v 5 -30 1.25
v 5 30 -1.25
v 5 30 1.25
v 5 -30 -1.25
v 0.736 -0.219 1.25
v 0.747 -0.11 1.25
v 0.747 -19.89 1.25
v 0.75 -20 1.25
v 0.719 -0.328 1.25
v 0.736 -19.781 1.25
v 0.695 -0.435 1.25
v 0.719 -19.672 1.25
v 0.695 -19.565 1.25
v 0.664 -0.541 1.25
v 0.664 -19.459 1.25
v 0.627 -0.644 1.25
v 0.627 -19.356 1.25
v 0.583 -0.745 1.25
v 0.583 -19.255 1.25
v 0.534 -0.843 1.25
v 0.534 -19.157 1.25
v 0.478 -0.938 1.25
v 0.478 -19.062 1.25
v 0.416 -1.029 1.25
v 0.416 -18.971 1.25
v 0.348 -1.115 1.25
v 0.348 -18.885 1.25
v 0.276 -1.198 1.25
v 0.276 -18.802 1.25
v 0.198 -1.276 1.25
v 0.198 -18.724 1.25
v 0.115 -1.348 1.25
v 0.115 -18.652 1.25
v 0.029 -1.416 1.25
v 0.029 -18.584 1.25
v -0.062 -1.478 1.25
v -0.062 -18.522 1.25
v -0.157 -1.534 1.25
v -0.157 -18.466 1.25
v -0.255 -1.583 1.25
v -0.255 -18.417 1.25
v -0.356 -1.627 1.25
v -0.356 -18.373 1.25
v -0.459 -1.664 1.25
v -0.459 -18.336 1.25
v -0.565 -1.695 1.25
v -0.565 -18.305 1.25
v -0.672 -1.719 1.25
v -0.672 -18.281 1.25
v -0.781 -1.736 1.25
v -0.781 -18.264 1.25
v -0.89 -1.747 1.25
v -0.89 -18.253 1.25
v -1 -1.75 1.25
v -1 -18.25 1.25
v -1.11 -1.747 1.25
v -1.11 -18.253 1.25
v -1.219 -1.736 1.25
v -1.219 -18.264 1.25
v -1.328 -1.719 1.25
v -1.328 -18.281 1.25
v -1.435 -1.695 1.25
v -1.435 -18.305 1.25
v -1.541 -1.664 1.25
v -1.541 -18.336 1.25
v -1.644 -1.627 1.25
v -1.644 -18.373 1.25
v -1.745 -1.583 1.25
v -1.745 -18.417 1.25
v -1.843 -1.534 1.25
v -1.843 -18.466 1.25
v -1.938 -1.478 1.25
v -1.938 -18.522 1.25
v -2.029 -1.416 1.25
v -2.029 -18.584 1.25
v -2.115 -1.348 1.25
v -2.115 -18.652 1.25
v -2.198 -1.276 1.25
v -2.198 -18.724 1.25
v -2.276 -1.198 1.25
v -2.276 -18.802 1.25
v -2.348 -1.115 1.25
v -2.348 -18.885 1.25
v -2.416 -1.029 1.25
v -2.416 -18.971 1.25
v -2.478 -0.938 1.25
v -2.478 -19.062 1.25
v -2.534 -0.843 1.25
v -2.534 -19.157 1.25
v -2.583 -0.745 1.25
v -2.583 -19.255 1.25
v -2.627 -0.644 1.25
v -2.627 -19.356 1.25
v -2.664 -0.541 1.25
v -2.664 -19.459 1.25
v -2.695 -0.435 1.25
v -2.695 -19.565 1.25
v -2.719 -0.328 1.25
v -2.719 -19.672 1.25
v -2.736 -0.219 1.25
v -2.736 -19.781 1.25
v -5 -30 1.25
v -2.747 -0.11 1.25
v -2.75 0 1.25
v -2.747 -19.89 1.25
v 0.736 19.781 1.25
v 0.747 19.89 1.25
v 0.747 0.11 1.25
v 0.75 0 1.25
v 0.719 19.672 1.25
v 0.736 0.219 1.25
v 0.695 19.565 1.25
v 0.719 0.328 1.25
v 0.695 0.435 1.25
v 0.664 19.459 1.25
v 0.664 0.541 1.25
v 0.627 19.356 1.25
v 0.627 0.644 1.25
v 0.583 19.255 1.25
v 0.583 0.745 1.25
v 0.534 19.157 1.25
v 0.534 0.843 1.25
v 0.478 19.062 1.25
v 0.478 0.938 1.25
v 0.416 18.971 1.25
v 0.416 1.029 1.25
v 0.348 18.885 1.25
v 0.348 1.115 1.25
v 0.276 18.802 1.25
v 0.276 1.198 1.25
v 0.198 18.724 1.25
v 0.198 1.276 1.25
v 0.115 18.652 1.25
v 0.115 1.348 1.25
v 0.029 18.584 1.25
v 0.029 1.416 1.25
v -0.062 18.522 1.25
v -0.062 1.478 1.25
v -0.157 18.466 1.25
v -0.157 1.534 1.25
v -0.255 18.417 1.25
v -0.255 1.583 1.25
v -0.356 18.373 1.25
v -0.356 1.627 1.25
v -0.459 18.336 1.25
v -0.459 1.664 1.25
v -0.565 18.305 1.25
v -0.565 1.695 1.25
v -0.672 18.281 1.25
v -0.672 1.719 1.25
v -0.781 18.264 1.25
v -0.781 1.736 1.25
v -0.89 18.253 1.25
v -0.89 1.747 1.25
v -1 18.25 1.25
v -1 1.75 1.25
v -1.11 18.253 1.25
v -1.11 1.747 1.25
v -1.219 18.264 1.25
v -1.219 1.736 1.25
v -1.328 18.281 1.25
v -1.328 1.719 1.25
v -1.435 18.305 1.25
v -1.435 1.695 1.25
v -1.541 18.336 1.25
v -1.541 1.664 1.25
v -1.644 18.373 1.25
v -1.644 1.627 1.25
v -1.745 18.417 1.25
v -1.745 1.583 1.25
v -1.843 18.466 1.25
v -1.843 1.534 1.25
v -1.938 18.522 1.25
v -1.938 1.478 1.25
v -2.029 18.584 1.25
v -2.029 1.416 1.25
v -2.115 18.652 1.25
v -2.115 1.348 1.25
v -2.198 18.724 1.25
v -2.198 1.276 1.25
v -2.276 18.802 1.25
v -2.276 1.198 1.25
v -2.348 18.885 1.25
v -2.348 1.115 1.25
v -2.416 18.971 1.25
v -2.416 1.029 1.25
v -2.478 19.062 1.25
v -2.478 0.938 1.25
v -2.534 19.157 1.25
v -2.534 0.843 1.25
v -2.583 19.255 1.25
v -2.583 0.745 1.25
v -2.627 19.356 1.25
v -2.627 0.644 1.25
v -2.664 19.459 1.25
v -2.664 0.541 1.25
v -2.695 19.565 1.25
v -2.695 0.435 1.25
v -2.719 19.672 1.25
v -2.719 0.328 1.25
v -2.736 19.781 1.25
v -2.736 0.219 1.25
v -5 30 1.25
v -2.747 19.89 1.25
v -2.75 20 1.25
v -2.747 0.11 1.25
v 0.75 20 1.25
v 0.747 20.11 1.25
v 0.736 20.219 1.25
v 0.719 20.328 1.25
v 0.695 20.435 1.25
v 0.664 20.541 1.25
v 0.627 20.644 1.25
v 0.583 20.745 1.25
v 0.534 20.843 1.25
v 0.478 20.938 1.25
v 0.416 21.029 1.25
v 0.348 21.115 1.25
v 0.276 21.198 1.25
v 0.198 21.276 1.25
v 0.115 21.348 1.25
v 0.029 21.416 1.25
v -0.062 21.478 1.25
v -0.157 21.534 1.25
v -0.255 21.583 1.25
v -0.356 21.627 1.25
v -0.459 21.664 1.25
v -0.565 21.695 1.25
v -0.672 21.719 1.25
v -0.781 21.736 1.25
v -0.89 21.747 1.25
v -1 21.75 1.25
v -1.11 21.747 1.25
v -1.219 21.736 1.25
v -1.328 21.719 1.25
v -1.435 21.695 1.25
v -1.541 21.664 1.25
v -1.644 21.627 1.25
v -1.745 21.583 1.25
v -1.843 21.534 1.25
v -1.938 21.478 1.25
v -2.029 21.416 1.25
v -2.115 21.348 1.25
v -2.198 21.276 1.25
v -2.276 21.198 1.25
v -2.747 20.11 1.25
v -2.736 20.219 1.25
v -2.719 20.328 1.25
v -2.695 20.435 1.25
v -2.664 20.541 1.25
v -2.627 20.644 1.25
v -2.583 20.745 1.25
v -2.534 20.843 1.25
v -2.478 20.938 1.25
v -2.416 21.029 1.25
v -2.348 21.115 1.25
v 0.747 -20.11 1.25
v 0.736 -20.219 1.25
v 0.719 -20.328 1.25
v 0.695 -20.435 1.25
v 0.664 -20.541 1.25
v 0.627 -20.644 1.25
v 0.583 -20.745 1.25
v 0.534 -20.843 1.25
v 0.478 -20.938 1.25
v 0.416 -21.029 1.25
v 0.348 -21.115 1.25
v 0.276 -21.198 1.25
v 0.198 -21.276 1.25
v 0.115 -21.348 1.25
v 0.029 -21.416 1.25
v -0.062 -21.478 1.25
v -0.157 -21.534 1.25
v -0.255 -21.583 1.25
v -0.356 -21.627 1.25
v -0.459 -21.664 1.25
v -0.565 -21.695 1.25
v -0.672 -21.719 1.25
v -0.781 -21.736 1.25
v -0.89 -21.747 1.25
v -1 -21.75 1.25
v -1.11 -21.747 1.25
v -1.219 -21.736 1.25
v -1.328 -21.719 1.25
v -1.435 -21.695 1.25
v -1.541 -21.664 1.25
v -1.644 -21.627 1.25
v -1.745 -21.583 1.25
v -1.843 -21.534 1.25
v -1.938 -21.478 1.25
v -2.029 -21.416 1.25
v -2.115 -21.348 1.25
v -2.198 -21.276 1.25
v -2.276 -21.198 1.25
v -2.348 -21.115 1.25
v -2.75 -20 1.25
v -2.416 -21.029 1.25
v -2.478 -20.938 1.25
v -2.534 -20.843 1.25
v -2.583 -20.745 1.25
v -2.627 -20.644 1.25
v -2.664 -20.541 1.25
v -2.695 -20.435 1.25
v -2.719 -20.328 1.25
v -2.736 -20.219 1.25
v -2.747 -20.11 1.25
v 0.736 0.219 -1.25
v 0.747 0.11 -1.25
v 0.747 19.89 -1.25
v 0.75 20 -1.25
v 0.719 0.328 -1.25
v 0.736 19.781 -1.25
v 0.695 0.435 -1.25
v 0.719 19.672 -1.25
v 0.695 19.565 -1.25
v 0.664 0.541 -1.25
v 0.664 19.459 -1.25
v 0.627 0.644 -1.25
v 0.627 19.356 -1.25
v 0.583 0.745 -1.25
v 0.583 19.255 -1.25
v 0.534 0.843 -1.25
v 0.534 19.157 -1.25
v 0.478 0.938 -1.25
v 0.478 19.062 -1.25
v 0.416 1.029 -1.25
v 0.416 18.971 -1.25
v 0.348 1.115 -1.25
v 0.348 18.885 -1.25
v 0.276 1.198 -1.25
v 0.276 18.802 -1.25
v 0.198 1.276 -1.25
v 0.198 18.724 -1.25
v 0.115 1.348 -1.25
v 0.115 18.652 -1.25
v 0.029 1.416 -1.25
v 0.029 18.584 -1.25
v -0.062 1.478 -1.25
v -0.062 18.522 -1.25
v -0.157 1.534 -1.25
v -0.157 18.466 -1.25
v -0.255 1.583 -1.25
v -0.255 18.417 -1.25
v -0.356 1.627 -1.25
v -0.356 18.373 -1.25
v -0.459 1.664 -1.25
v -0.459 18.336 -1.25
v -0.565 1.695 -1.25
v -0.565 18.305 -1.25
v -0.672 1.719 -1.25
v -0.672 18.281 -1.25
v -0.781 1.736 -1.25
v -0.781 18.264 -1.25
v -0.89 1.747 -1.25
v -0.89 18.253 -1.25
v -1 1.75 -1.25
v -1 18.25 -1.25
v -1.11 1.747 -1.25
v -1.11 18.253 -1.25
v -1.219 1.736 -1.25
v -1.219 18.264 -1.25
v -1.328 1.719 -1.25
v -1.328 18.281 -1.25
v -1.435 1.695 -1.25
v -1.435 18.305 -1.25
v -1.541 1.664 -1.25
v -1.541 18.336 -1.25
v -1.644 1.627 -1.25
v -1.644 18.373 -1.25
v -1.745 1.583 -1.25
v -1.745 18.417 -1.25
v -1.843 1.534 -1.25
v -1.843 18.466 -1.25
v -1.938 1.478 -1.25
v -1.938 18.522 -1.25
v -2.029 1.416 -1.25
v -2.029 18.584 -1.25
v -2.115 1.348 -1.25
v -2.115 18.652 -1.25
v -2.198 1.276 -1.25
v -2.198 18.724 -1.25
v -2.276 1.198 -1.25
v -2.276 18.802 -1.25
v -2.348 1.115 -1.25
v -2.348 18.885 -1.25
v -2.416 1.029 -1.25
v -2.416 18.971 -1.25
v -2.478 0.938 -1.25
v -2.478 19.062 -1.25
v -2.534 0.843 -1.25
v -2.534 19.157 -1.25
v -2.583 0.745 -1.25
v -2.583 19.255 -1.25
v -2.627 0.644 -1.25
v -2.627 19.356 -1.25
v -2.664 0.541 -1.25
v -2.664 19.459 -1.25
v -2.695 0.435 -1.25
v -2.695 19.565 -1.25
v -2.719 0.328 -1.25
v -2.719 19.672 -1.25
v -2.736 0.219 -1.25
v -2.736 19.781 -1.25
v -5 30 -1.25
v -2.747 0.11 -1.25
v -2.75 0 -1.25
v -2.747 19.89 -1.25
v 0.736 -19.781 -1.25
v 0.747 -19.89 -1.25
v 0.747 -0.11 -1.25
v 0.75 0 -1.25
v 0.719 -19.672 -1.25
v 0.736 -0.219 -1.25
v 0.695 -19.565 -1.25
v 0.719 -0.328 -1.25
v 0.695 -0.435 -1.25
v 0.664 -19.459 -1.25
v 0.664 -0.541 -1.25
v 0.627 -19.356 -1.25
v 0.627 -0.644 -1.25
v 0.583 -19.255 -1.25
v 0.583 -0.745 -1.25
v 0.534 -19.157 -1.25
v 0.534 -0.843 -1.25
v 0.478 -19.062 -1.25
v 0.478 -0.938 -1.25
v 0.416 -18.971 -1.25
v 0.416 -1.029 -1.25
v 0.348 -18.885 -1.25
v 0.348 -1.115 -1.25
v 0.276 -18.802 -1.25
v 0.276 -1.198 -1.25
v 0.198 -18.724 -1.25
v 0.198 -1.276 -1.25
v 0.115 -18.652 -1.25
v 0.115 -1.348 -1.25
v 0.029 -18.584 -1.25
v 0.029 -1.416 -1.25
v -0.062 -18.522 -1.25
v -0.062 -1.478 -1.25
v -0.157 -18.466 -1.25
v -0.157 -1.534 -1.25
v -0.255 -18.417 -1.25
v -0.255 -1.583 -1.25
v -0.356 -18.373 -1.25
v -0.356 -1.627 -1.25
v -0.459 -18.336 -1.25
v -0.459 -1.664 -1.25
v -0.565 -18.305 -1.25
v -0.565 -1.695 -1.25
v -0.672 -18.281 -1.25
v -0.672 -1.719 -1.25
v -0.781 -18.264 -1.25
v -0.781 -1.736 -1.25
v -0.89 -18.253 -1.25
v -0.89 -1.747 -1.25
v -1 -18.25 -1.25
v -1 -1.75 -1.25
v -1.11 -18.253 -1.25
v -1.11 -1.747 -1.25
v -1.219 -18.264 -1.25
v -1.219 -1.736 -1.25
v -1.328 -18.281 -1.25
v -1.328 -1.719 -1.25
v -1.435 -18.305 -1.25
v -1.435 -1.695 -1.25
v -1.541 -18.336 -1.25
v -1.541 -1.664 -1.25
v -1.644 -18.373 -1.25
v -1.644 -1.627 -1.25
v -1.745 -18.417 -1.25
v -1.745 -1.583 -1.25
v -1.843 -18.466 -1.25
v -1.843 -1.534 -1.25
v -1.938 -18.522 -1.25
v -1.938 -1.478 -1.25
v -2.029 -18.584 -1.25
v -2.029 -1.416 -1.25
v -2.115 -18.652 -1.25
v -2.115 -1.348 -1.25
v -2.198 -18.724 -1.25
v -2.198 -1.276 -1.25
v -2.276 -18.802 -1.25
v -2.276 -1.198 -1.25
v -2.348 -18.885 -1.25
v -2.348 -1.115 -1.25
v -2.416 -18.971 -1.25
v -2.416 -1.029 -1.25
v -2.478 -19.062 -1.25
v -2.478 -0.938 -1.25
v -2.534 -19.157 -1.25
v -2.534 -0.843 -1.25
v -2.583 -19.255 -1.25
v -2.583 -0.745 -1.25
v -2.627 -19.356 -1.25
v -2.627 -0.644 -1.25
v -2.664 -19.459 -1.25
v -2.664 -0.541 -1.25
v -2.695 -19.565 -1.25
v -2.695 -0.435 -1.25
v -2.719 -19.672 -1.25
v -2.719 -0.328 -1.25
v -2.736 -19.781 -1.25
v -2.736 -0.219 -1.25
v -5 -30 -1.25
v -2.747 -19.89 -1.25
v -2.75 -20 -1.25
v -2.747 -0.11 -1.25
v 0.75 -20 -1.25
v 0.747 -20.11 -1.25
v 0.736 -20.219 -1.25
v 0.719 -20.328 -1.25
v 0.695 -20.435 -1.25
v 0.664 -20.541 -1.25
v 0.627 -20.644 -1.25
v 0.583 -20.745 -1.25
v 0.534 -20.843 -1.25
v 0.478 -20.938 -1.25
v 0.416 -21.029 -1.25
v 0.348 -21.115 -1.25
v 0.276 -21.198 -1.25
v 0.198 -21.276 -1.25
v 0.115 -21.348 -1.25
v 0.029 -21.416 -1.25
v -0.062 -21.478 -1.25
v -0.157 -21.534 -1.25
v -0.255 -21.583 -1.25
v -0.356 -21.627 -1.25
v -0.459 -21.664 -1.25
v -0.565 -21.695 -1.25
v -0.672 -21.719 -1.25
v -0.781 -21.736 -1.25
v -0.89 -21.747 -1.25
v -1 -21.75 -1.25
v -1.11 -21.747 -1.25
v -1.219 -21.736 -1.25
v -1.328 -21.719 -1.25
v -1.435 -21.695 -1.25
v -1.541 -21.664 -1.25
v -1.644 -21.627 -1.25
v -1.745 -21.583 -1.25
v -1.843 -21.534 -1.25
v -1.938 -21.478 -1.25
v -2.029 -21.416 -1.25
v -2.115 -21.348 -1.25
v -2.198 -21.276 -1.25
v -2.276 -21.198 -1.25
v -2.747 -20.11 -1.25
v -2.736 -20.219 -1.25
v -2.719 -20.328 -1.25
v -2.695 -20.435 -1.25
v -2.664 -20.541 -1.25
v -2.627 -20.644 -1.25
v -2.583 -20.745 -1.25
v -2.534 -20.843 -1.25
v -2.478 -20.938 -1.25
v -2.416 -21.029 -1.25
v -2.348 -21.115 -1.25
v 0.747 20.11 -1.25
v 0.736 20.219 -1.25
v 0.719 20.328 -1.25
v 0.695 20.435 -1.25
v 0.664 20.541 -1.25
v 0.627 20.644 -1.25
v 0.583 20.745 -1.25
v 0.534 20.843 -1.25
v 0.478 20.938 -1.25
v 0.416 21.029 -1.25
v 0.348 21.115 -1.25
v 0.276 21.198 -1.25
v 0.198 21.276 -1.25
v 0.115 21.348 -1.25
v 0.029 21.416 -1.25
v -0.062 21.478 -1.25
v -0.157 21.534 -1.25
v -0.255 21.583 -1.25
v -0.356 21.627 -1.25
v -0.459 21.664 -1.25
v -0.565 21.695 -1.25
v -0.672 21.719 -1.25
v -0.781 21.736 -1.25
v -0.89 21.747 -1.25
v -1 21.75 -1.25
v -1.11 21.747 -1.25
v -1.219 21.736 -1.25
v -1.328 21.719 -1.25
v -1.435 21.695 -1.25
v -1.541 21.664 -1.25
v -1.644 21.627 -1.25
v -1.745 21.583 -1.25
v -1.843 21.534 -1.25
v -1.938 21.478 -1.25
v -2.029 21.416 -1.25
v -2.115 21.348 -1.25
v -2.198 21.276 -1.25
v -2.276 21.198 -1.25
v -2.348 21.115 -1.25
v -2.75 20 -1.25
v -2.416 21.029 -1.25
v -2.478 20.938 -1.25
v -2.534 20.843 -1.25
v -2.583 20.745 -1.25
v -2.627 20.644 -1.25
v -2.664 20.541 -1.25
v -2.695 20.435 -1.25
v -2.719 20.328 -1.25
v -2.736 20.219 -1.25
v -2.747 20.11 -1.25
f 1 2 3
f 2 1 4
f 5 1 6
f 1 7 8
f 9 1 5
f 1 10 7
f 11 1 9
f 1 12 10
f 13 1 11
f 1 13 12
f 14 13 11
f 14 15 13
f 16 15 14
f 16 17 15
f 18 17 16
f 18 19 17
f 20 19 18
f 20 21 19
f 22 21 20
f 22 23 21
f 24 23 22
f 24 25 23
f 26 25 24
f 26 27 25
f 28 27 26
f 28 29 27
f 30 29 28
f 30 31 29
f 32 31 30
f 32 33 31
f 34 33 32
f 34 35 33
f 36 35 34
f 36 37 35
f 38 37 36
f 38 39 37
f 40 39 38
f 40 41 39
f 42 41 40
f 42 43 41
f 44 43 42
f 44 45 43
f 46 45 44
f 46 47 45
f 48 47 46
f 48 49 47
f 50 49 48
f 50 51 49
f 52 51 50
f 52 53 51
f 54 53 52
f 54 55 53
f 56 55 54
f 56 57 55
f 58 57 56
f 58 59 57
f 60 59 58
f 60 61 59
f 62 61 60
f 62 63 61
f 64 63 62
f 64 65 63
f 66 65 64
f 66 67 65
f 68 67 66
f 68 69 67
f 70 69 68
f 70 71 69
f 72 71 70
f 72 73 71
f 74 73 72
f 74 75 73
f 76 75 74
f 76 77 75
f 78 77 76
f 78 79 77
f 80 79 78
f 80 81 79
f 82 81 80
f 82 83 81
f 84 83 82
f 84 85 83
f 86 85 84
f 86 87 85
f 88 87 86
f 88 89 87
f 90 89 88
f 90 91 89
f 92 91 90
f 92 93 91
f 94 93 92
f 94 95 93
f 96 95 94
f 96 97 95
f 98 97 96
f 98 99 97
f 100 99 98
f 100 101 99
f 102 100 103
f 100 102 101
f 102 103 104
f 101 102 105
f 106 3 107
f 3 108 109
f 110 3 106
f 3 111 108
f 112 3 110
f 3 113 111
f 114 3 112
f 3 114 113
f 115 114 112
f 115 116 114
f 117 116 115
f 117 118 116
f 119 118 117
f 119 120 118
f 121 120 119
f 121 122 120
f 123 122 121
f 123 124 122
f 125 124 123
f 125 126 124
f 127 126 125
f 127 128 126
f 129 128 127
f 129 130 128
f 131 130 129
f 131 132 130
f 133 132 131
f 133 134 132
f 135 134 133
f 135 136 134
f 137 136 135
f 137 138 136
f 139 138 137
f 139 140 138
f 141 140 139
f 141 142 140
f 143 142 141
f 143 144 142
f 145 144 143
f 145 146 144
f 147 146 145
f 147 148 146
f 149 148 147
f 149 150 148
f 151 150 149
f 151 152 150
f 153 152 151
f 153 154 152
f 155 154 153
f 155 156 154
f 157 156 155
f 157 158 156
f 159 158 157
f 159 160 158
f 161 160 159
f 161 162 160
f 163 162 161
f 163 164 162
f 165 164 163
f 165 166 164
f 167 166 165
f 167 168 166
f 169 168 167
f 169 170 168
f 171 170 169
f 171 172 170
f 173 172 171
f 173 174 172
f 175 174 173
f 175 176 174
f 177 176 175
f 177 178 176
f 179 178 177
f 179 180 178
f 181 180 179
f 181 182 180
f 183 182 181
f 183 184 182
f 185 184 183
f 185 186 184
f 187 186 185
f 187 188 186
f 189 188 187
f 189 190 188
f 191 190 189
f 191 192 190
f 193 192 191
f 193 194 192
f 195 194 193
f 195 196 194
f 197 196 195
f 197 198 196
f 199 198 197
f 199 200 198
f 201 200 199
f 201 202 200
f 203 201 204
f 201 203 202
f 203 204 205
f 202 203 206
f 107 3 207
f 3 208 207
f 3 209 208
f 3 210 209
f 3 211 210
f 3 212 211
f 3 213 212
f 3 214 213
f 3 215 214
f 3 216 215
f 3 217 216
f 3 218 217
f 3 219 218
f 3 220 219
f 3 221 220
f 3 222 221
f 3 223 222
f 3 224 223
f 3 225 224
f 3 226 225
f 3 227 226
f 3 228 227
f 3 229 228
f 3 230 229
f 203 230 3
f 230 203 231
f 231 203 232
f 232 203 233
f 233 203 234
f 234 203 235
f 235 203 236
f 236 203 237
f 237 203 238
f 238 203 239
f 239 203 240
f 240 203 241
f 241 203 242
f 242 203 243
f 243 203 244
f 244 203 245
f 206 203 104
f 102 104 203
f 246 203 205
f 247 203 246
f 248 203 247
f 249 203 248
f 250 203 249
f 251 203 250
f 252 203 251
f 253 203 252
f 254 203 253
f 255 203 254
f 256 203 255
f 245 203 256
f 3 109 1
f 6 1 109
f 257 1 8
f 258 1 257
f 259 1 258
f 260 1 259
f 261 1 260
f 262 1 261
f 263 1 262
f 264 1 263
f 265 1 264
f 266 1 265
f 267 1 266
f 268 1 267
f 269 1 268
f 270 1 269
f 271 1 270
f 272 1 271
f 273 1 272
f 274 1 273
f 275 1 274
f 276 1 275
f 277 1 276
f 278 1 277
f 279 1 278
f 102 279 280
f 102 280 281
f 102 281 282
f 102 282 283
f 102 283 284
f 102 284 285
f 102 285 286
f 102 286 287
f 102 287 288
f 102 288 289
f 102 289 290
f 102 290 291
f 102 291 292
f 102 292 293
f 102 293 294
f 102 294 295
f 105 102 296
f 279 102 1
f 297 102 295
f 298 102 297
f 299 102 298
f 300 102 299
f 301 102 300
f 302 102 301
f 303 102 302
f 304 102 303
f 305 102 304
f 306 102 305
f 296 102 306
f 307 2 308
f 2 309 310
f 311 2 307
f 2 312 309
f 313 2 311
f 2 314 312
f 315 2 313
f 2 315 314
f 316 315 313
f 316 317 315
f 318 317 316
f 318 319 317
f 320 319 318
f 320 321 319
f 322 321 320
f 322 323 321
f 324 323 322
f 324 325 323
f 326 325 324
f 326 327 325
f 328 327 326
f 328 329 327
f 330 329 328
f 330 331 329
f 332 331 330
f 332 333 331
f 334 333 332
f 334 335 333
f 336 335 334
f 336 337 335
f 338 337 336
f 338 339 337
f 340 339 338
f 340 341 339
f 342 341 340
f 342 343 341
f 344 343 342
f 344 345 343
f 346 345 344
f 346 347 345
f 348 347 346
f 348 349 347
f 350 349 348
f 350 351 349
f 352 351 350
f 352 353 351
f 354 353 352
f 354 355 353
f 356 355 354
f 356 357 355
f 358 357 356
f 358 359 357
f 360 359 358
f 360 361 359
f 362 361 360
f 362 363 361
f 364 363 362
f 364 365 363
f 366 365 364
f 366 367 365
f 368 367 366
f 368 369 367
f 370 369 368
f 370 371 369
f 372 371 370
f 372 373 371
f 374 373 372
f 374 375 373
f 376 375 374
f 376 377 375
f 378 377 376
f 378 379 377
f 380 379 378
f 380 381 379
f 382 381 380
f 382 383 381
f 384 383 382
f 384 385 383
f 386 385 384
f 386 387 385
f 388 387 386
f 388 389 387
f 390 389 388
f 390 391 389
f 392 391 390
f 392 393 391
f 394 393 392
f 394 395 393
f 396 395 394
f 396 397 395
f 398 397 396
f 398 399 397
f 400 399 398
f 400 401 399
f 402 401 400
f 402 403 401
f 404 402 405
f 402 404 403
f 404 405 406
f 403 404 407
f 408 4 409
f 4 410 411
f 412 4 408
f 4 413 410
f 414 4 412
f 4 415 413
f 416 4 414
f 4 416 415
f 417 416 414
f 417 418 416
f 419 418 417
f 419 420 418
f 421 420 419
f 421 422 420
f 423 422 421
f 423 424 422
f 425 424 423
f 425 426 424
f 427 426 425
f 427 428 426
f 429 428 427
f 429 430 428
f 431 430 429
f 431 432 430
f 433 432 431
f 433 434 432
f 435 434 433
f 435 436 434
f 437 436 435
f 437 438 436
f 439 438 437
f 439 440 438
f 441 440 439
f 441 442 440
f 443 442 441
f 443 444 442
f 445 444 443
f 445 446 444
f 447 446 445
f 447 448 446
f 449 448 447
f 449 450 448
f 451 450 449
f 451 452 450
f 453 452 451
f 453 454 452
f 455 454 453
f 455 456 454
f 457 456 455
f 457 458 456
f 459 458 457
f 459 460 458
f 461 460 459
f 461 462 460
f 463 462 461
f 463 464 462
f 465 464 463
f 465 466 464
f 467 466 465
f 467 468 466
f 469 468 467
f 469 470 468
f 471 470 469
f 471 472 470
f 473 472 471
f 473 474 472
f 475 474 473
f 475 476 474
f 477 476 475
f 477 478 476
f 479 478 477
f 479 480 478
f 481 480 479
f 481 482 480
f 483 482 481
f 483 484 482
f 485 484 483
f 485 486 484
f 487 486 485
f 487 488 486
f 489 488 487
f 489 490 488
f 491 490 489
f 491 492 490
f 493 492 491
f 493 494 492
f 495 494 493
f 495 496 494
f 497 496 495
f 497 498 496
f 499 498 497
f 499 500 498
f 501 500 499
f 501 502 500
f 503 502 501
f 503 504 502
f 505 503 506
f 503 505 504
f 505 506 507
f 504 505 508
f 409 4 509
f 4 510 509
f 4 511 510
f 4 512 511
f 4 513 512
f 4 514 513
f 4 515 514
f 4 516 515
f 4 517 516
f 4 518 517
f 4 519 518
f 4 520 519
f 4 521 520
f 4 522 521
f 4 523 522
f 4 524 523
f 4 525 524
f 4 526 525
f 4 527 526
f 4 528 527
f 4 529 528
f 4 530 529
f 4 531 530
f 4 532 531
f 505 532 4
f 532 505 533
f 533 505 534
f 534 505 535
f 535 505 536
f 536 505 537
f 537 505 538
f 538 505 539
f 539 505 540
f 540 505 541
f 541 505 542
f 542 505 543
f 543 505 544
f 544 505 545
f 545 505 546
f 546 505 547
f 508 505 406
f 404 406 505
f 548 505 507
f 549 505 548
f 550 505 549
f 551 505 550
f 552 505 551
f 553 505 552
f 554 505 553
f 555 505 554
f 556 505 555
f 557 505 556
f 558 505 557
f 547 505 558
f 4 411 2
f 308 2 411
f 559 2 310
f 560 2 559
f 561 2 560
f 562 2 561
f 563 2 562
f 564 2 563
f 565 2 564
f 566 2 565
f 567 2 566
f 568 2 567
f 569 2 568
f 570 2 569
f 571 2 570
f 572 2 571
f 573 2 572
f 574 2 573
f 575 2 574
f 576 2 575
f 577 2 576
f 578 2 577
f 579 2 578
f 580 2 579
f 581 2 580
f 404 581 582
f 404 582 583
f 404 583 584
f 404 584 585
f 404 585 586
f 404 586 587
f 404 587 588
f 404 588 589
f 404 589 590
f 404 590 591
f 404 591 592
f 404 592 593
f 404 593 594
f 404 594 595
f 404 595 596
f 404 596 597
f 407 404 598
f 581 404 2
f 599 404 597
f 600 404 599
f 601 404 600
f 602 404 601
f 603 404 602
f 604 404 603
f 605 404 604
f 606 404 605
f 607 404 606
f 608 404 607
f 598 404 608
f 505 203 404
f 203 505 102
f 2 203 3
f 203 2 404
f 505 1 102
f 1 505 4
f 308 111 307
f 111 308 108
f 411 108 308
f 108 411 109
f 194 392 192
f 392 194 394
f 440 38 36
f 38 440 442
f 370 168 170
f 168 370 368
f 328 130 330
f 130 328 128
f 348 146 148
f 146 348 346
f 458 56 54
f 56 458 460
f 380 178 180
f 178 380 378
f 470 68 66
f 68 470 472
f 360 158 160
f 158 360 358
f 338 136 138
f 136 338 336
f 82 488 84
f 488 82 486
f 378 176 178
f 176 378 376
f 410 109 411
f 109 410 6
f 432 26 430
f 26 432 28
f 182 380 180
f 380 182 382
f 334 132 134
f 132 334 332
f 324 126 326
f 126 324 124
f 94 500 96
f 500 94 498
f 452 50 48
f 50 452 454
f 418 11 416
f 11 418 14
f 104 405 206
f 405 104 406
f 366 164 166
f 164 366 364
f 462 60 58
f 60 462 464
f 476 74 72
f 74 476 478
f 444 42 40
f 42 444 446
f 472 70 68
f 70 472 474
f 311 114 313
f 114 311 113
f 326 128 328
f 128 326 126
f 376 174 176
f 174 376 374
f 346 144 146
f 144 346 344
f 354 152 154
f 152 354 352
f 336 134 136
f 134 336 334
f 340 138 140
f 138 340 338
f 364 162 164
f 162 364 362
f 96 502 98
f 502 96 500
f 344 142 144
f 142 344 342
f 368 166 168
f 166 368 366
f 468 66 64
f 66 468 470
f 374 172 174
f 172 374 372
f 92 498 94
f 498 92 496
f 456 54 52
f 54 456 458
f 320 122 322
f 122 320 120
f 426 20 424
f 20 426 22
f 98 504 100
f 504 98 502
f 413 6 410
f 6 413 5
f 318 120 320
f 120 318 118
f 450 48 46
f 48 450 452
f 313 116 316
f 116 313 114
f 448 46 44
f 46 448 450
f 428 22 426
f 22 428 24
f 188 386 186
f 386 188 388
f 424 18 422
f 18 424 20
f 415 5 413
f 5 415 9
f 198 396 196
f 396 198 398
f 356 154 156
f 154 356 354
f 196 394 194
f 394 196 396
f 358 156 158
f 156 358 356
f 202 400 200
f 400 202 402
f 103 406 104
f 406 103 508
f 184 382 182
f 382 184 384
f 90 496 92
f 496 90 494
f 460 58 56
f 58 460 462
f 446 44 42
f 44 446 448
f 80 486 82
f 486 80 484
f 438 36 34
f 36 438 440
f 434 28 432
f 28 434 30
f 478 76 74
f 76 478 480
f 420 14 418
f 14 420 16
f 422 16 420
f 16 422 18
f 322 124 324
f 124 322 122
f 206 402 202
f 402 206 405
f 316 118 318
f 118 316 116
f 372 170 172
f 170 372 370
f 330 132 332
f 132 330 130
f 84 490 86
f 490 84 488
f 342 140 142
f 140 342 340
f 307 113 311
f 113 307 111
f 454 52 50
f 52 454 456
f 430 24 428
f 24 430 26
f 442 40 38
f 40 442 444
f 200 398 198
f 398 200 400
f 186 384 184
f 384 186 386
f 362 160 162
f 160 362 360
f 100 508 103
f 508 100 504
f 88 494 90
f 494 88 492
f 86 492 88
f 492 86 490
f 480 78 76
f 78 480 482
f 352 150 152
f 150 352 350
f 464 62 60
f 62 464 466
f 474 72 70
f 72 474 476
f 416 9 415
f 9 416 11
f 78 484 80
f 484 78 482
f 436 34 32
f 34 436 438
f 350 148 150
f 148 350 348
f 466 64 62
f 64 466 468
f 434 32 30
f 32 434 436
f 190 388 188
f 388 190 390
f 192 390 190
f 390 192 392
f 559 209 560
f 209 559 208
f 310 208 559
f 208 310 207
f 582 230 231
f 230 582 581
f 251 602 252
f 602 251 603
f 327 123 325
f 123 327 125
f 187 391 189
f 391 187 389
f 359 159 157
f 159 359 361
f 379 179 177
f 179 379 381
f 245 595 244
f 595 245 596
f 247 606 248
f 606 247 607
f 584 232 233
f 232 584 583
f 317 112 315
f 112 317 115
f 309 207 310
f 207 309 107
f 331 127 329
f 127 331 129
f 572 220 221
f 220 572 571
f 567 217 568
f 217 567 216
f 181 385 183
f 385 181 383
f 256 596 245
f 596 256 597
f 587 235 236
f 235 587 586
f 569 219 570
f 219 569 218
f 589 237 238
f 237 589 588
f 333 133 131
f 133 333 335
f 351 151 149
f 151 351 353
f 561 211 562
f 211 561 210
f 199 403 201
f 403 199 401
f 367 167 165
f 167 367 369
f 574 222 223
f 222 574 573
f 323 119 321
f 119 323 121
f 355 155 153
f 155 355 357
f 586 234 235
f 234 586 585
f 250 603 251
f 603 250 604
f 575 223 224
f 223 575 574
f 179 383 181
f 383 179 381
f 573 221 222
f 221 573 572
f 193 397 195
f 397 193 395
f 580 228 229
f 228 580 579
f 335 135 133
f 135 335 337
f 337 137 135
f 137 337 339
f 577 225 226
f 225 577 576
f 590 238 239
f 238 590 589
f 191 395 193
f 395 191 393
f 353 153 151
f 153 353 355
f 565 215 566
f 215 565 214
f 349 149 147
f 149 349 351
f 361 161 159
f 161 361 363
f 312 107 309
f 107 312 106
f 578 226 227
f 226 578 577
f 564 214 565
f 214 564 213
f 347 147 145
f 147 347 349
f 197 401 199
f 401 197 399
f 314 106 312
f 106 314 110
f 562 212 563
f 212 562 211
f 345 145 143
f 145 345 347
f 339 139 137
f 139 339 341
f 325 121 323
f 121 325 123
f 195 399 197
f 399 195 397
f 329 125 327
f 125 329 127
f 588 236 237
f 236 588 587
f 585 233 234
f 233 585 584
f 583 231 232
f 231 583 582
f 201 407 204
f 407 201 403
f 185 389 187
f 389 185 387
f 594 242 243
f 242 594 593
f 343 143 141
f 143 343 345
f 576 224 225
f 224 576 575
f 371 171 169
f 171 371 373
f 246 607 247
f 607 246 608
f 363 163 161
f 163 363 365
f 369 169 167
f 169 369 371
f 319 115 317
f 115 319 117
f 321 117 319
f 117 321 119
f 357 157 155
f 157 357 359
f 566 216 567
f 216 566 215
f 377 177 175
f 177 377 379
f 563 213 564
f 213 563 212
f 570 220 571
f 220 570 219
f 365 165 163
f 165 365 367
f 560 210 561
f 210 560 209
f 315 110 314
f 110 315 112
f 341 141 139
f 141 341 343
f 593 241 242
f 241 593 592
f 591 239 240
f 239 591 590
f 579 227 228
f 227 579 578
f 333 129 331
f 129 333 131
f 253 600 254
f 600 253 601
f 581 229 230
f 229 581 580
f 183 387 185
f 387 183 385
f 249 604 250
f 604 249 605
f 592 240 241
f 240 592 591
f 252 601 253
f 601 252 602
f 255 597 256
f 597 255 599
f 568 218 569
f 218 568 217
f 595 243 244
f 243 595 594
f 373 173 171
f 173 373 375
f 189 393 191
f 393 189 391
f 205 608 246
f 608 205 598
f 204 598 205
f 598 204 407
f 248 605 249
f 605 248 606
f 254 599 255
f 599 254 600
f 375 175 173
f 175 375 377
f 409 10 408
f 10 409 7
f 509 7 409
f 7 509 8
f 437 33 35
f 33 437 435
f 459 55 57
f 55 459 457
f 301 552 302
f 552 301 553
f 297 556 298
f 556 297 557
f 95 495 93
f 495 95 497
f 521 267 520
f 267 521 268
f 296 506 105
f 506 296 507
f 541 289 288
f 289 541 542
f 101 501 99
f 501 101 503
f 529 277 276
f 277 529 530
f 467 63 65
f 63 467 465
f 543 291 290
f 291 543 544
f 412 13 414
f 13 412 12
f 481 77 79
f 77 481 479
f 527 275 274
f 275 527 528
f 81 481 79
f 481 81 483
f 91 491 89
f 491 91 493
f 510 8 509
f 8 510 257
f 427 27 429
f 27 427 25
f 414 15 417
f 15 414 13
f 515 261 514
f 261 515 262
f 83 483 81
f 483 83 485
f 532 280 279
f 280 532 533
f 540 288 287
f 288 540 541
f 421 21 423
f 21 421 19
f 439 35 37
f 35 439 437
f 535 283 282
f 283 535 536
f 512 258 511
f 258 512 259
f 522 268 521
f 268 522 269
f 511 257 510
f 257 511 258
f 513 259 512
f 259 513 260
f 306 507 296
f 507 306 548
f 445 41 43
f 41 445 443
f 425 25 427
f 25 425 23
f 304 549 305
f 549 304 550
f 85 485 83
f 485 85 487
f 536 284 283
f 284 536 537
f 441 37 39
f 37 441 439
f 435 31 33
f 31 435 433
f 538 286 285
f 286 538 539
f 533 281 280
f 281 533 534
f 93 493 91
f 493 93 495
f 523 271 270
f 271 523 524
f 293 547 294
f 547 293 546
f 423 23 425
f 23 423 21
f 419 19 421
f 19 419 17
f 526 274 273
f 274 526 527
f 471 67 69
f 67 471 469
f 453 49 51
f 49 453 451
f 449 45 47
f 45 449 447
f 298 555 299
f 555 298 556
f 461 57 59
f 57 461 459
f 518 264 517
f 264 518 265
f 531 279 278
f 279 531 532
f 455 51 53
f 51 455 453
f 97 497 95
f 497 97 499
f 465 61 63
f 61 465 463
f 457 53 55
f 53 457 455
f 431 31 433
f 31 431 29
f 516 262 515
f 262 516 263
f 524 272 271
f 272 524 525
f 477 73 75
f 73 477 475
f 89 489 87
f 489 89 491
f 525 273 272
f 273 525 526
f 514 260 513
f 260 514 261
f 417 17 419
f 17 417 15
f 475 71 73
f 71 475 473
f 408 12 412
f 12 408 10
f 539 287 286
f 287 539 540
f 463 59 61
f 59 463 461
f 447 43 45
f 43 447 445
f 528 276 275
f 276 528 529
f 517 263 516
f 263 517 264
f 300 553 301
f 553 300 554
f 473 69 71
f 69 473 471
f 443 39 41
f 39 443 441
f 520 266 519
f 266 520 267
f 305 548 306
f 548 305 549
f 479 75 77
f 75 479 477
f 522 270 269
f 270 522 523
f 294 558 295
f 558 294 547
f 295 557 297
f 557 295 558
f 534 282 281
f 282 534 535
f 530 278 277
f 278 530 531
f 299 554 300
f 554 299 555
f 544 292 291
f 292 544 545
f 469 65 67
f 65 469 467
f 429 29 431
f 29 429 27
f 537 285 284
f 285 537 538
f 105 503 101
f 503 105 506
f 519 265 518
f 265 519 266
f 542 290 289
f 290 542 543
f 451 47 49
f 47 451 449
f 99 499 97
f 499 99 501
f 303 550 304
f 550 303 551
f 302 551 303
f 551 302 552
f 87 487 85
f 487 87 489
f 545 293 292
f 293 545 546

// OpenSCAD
barretta();

module barretta(){
difference(){
 cube([10,60,2.5],center=true);
    translate([-1,0,0])
    cylinder(h=30,r=3.5/2,$fn=100,center=true);
    translate([-1,20,0])
    cylinder(h=30,r=3.5/2,$fn=100,center=true);
      translate([-1,-20,0])
    cylinder(h=30,r=3.5/2,$fn=100,center=true);
}
}
